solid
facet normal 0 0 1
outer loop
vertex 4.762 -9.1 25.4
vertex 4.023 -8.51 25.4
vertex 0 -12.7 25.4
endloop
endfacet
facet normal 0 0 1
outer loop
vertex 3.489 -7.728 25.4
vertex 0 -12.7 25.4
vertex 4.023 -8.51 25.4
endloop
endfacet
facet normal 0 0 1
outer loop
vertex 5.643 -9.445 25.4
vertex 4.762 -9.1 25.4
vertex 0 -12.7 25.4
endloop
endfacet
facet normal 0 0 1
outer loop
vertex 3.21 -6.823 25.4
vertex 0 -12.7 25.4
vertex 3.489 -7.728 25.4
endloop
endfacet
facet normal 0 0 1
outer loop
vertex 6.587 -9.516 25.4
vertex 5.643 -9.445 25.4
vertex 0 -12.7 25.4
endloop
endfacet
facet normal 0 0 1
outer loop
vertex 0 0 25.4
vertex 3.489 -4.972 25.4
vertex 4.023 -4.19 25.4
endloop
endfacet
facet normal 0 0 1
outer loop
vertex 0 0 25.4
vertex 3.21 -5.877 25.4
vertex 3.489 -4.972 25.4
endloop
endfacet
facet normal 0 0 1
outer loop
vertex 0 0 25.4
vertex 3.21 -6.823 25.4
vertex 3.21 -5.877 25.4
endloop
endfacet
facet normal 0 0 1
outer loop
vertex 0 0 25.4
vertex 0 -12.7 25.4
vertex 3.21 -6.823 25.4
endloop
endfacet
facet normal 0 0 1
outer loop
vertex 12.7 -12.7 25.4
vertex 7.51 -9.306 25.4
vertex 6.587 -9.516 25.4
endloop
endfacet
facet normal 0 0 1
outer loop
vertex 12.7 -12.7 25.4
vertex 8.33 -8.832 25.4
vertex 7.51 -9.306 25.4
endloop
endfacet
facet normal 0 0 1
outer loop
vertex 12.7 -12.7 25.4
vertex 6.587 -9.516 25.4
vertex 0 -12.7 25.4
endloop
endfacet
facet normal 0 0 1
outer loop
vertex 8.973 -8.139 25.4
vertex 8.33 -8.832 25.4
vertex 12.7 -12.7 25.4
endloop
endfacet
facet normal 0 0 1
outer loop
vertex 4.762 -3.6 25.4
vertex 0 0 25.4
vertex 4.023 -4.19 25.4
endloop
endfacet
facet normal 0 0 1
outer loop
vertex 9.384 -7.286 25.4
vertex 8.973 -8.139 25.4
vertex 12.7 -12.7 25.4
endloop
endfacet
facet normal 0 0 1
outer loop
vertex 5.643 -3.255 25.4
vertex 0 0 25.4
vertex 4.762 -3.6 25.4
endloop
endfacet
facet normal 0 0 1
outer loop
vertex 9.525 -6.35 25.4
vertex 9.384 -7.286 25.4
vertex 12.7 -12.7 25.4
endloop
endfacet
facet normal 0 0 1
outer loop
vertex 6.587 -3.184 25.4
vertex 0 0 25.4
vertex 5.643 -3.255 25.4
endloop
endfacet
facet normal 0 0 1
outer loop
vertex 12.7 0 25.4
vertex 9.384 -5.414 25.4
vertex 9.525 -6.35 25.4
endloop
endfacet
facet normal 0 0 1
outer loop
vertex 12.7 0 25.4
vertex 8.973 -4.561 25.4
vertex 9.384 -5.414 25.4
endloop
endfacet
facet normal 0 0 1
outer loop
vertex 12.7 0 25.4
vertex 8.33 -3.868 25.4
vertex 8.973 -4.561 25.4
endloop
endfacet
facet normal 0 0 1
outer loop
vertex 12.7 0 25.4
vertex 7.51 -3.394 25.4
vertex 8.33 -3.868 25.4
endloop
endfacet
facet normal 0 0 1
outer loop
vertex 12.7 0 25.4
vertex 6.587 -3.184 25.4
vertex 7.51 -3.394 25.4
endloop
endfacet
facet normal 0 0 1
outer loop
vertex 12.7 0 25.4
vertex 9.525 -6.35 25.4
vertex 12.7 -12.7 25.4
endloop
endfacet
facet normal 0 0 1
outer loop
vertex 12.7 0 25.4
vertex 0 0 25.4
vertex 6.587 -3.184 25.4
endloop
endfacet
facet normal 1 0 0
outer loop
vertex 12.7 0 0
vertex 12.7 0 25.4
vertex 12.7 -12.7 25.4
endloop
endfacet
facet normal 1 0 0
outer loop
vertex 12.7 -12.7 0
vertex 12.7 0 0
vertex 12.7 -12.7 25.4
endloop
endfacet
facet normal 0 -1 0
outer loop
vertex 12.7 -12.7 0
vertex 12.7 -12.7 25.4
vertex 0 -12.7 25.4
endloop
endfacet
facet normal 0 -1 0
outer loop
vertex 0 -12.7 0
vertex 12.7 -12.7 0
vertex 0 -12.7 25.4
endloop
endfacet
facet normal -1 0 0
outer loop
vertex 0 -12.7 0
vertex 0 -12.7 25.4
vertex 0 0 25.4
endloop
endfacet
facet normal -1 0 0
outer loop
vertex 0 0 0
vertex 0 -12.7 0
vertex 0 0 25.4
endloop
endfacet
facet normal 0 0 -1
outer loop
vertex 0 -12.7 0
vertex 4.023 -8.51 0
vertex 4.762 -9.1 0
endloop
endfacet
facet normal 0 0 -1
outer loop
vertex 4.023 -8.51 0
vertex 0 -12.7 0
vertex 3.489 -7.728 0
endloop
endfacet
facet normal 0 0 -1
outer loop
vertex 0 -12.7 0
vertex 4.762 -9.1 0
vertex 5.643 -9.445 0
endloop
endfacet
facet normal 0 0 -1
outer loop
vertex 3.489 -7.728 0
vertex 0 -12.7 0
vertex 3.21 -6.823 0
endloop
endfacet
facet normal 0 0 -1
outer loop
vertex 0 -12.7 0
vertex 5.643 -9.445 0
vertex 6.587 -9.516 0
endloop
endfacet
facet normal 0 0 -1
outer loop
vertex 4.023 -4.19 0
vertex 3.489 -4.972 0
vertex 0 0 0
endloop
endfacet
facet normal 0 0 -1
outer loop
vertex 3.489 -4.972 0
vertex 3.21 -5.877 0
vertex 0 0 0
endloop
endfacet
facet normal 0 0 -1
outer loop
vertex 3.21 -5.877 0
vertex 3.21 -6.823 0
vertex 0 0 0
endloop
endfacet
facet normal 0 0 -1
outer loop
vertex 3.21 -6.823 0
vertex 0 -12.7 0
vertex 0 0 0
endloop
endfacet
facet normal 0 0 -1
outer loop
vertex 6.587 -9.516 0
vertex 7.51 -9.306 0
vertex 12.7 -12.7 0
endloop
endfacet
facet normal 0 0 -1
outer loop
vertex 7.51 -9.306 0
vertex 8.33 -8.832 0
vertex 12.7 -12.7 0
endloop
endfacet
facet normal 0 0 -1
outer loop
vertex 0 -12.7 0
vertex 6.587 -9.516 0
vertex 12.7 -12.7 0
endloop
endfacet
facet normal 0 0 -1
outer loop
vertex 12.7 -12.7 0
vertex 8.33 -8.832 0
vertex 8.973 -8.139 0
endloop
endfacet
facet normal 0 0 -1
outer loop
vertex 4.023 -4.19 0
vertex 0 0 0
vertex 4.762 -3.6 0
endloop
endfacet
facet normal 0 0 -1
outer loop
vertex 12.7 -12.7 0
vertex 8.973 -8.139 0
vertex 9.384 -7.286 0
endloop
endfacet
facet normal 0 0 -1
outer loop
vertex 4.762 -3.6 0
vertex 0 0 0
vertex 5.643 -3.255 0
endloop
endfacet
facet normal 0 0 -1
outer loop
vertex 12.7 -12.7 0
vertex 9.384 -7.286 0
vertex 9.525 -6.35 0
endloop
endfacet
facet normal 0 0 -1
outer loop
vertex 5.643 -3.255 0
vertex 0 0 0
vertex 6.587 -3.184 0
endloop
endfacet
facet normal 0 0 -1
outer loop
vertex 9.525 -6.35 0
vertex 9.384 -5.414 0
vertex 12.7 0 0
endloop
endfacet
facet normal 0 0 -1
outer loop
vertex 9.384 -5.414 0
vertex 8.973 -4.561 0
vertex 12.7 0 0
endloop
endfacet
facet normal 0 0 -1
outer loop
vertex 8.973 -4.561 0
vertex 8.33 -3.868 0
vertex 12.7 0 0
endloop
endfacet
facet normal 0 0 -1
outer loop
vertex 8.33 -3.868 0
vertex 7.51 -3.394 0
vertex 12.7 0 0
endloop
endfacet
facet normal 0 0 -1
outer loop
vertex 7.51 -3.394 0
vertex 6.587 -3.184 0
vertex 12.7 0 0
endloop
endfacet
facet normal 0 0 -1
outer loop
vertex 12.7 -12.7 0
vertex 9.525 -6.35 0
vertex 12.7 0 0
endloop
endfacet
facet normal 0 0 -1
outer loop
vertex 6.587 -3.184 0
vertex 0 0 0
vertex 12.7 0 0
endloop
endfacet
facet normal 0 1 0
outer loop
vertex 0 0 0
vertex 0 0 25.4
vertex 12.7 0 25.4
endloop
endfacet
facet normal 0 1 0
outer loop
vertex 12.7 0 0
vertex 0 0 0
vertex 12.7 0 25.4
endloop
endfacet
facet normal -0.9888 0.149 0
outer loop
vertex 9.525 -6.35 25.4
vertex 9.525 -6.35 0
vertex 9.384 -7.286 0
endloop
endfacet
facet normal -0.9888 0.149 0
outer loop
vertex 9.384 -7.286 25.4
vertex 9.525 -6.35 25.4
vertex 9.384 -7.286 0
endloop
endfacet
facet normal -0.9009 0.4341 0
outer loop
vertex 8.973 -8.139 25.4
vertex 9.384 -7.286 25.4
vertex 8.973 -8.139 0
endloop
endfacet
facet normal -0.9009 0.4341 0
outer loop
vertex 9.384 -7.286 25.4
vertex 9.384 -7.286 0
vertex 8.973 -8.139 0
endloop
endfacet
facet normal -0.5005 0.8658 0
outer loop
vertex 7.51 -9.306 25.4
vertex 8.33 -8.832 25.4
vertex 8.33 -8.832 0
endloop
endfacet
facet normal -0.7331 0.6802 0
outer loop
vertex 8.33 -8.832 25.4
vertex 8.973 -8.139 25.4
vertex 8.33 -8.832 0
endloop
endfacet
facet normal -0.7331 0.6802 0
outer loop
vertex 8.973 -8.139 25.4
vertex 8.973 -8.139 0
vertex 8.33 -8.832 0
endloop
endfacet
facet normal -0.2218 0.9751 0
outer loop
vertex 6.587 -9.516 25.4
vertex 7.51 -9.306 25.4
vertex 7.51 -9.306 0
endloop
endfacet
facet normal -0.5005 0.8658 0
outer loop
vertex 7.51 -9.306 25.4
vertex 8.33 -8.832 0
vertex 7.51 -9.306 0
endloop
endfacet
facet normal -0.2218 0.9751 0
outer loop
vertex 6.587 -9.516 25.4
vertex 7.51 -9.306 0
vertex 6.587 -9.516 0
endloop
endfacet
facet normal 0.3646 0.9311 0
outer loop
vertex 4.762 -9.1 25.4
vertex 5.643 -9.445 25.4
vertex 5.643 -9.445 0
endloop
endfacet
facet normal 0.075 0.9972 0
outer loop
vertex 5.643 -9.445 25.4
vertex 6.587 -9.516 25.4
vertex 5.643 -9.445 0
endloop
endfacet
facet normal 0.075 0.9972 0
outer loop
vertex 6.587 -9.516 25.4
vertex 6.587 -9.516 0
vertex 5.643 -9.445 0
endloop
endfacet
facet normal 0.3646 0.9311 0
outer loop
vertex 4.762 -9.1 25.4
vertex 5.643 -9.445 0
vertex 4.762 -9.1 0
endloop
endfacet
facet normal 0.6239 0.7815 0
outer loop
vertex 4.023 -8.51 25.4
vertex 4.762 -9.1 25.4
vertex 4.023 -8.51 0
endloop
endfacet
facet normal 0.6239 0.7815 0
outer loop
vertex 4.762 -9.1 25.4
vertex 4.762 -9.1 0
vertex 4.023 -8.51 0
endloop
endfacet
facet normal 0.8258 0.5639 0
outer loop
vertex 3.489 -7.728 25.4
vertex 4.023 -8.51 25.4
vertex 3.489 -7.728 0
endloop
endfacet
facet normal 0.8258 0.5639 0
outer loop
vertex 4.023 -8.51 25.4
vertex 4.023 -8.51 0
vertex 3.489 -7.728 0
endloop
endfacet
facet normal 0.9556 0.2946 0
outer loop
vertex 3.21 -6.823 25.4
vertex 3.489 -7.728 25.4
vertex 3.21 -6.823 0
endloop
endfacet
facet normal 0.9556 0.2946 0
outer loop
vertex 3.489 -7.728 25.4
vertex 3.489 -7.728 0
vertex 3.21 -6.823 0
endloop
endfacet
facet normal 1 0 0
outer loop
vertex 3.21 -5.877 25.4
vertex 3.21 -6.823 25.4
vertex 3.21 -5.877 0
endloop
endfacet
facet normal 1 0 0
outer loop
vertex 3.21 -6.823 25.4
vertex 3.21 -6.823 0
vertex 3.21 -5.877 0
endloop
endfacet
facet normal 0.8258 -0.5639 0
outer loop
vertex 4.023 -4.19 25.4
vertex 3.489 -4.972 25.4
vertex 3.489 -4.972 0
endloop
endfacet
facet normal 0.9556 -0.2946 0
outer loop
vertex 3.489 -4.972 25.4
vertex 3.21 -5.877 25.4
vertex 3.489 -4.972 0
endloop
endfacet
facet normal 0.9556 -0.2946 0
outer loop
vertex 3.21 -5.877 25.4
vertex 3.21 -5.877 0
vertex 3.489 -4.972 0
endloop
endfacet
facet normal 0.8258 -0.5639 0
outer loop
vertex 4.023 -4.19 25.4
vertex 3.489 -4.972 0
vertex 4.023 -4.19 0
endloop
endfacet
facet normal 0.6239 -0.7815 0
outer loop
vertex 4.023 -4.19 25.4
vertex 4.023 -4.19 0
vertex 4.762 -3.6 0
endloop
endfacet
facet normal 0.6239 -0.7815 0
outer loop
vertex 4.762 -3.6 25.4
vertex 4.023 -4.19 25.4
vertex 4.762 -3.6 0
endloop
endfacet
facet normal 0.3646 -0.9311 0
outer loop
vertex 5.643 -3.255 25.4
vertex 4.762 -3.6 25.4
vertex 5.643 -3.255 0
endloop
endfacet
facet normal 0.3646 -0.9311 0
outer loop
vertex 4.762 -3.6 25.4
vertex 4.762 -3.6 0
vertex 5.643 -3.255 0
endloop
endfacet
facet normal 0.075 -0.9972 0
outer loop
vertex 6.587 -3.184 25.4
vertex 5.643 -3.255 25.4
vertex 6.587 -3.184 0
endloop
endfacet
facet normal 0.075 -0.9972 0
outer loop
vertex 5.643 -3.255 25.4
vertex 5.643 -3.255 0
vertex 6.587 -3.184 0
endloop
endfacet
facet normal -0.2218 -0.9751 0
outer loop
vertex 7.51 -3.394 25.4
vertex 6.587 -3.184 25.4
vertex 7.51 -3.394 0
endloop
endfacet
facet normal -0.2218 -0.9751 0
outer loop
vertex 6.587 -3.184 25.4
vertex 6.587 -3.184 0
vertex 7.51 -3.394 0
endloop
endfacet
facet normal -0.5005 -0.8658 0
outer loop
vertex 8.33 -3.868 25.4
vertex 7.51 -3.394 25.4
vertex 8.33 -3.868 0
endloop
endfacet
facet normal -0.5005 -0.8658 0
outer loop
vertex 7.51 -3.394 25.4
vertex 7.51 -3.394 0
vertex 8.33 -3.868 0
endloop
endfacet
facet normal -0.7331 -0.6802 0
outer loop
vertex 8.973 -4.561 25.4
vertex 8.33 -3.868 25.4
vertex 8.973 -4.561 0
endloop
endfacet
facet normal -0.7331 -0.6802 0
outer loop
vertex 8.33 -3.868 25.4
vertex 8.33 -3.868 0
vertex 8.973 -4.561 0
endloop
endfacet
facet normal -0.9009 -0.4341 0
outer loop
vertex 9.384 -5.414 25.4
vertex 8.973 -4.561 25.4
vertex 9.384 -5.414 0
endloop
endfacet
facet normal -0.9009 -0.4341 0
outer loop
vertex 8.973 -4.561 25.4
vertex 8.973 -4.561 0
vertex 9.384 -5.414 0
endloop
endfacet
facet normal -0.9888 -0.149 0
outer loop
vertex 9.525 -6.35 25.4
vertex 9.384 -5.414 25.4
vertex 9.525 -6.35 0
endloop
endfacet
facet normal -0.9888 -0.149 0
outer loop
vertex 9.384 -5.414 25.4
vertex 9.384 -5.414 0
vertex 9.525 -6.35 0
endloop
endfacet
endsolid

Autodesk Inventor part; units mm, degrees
ref_plane "YZ Plane" through (0, 0, 0) normal (1, 0, 0) x (0, 1, 0)
ref_plane "XZ Plane" through (0, 0, 0) normal (0, 1, 0) x (-1, 0, 0)
ref_plane "XY Plane" through (0, 0, 0) normal (0, 0, 1) x (1, 0, 0)
sketch "Sketch1" plane through (0, 0, 0) normal (0, 0, 1) x (1, 0, 0)
  line L0 (0, 0) -> (12.7, 0)
  line L1 (12.7, 0) -> (12.7, -12.7)
  line L2 (12.7, -12.7) -> (0, -12.7)
  line L3 (0, -12.7) -> (0, 0)
  circle A0 centre (6.35, -6.35) radius 3.175
  dimension "d0" = 6.35
  dimension "d1" = 12.7
  dimension "d2" = 12.7
  dimension "d3" = 6.35
  dimension "d4" = 6.35
extrude "Extrusion1" add sketch "Sketch1" along normal blind 25.4
properties part number "boltholder" material "Aluminum 6061"
